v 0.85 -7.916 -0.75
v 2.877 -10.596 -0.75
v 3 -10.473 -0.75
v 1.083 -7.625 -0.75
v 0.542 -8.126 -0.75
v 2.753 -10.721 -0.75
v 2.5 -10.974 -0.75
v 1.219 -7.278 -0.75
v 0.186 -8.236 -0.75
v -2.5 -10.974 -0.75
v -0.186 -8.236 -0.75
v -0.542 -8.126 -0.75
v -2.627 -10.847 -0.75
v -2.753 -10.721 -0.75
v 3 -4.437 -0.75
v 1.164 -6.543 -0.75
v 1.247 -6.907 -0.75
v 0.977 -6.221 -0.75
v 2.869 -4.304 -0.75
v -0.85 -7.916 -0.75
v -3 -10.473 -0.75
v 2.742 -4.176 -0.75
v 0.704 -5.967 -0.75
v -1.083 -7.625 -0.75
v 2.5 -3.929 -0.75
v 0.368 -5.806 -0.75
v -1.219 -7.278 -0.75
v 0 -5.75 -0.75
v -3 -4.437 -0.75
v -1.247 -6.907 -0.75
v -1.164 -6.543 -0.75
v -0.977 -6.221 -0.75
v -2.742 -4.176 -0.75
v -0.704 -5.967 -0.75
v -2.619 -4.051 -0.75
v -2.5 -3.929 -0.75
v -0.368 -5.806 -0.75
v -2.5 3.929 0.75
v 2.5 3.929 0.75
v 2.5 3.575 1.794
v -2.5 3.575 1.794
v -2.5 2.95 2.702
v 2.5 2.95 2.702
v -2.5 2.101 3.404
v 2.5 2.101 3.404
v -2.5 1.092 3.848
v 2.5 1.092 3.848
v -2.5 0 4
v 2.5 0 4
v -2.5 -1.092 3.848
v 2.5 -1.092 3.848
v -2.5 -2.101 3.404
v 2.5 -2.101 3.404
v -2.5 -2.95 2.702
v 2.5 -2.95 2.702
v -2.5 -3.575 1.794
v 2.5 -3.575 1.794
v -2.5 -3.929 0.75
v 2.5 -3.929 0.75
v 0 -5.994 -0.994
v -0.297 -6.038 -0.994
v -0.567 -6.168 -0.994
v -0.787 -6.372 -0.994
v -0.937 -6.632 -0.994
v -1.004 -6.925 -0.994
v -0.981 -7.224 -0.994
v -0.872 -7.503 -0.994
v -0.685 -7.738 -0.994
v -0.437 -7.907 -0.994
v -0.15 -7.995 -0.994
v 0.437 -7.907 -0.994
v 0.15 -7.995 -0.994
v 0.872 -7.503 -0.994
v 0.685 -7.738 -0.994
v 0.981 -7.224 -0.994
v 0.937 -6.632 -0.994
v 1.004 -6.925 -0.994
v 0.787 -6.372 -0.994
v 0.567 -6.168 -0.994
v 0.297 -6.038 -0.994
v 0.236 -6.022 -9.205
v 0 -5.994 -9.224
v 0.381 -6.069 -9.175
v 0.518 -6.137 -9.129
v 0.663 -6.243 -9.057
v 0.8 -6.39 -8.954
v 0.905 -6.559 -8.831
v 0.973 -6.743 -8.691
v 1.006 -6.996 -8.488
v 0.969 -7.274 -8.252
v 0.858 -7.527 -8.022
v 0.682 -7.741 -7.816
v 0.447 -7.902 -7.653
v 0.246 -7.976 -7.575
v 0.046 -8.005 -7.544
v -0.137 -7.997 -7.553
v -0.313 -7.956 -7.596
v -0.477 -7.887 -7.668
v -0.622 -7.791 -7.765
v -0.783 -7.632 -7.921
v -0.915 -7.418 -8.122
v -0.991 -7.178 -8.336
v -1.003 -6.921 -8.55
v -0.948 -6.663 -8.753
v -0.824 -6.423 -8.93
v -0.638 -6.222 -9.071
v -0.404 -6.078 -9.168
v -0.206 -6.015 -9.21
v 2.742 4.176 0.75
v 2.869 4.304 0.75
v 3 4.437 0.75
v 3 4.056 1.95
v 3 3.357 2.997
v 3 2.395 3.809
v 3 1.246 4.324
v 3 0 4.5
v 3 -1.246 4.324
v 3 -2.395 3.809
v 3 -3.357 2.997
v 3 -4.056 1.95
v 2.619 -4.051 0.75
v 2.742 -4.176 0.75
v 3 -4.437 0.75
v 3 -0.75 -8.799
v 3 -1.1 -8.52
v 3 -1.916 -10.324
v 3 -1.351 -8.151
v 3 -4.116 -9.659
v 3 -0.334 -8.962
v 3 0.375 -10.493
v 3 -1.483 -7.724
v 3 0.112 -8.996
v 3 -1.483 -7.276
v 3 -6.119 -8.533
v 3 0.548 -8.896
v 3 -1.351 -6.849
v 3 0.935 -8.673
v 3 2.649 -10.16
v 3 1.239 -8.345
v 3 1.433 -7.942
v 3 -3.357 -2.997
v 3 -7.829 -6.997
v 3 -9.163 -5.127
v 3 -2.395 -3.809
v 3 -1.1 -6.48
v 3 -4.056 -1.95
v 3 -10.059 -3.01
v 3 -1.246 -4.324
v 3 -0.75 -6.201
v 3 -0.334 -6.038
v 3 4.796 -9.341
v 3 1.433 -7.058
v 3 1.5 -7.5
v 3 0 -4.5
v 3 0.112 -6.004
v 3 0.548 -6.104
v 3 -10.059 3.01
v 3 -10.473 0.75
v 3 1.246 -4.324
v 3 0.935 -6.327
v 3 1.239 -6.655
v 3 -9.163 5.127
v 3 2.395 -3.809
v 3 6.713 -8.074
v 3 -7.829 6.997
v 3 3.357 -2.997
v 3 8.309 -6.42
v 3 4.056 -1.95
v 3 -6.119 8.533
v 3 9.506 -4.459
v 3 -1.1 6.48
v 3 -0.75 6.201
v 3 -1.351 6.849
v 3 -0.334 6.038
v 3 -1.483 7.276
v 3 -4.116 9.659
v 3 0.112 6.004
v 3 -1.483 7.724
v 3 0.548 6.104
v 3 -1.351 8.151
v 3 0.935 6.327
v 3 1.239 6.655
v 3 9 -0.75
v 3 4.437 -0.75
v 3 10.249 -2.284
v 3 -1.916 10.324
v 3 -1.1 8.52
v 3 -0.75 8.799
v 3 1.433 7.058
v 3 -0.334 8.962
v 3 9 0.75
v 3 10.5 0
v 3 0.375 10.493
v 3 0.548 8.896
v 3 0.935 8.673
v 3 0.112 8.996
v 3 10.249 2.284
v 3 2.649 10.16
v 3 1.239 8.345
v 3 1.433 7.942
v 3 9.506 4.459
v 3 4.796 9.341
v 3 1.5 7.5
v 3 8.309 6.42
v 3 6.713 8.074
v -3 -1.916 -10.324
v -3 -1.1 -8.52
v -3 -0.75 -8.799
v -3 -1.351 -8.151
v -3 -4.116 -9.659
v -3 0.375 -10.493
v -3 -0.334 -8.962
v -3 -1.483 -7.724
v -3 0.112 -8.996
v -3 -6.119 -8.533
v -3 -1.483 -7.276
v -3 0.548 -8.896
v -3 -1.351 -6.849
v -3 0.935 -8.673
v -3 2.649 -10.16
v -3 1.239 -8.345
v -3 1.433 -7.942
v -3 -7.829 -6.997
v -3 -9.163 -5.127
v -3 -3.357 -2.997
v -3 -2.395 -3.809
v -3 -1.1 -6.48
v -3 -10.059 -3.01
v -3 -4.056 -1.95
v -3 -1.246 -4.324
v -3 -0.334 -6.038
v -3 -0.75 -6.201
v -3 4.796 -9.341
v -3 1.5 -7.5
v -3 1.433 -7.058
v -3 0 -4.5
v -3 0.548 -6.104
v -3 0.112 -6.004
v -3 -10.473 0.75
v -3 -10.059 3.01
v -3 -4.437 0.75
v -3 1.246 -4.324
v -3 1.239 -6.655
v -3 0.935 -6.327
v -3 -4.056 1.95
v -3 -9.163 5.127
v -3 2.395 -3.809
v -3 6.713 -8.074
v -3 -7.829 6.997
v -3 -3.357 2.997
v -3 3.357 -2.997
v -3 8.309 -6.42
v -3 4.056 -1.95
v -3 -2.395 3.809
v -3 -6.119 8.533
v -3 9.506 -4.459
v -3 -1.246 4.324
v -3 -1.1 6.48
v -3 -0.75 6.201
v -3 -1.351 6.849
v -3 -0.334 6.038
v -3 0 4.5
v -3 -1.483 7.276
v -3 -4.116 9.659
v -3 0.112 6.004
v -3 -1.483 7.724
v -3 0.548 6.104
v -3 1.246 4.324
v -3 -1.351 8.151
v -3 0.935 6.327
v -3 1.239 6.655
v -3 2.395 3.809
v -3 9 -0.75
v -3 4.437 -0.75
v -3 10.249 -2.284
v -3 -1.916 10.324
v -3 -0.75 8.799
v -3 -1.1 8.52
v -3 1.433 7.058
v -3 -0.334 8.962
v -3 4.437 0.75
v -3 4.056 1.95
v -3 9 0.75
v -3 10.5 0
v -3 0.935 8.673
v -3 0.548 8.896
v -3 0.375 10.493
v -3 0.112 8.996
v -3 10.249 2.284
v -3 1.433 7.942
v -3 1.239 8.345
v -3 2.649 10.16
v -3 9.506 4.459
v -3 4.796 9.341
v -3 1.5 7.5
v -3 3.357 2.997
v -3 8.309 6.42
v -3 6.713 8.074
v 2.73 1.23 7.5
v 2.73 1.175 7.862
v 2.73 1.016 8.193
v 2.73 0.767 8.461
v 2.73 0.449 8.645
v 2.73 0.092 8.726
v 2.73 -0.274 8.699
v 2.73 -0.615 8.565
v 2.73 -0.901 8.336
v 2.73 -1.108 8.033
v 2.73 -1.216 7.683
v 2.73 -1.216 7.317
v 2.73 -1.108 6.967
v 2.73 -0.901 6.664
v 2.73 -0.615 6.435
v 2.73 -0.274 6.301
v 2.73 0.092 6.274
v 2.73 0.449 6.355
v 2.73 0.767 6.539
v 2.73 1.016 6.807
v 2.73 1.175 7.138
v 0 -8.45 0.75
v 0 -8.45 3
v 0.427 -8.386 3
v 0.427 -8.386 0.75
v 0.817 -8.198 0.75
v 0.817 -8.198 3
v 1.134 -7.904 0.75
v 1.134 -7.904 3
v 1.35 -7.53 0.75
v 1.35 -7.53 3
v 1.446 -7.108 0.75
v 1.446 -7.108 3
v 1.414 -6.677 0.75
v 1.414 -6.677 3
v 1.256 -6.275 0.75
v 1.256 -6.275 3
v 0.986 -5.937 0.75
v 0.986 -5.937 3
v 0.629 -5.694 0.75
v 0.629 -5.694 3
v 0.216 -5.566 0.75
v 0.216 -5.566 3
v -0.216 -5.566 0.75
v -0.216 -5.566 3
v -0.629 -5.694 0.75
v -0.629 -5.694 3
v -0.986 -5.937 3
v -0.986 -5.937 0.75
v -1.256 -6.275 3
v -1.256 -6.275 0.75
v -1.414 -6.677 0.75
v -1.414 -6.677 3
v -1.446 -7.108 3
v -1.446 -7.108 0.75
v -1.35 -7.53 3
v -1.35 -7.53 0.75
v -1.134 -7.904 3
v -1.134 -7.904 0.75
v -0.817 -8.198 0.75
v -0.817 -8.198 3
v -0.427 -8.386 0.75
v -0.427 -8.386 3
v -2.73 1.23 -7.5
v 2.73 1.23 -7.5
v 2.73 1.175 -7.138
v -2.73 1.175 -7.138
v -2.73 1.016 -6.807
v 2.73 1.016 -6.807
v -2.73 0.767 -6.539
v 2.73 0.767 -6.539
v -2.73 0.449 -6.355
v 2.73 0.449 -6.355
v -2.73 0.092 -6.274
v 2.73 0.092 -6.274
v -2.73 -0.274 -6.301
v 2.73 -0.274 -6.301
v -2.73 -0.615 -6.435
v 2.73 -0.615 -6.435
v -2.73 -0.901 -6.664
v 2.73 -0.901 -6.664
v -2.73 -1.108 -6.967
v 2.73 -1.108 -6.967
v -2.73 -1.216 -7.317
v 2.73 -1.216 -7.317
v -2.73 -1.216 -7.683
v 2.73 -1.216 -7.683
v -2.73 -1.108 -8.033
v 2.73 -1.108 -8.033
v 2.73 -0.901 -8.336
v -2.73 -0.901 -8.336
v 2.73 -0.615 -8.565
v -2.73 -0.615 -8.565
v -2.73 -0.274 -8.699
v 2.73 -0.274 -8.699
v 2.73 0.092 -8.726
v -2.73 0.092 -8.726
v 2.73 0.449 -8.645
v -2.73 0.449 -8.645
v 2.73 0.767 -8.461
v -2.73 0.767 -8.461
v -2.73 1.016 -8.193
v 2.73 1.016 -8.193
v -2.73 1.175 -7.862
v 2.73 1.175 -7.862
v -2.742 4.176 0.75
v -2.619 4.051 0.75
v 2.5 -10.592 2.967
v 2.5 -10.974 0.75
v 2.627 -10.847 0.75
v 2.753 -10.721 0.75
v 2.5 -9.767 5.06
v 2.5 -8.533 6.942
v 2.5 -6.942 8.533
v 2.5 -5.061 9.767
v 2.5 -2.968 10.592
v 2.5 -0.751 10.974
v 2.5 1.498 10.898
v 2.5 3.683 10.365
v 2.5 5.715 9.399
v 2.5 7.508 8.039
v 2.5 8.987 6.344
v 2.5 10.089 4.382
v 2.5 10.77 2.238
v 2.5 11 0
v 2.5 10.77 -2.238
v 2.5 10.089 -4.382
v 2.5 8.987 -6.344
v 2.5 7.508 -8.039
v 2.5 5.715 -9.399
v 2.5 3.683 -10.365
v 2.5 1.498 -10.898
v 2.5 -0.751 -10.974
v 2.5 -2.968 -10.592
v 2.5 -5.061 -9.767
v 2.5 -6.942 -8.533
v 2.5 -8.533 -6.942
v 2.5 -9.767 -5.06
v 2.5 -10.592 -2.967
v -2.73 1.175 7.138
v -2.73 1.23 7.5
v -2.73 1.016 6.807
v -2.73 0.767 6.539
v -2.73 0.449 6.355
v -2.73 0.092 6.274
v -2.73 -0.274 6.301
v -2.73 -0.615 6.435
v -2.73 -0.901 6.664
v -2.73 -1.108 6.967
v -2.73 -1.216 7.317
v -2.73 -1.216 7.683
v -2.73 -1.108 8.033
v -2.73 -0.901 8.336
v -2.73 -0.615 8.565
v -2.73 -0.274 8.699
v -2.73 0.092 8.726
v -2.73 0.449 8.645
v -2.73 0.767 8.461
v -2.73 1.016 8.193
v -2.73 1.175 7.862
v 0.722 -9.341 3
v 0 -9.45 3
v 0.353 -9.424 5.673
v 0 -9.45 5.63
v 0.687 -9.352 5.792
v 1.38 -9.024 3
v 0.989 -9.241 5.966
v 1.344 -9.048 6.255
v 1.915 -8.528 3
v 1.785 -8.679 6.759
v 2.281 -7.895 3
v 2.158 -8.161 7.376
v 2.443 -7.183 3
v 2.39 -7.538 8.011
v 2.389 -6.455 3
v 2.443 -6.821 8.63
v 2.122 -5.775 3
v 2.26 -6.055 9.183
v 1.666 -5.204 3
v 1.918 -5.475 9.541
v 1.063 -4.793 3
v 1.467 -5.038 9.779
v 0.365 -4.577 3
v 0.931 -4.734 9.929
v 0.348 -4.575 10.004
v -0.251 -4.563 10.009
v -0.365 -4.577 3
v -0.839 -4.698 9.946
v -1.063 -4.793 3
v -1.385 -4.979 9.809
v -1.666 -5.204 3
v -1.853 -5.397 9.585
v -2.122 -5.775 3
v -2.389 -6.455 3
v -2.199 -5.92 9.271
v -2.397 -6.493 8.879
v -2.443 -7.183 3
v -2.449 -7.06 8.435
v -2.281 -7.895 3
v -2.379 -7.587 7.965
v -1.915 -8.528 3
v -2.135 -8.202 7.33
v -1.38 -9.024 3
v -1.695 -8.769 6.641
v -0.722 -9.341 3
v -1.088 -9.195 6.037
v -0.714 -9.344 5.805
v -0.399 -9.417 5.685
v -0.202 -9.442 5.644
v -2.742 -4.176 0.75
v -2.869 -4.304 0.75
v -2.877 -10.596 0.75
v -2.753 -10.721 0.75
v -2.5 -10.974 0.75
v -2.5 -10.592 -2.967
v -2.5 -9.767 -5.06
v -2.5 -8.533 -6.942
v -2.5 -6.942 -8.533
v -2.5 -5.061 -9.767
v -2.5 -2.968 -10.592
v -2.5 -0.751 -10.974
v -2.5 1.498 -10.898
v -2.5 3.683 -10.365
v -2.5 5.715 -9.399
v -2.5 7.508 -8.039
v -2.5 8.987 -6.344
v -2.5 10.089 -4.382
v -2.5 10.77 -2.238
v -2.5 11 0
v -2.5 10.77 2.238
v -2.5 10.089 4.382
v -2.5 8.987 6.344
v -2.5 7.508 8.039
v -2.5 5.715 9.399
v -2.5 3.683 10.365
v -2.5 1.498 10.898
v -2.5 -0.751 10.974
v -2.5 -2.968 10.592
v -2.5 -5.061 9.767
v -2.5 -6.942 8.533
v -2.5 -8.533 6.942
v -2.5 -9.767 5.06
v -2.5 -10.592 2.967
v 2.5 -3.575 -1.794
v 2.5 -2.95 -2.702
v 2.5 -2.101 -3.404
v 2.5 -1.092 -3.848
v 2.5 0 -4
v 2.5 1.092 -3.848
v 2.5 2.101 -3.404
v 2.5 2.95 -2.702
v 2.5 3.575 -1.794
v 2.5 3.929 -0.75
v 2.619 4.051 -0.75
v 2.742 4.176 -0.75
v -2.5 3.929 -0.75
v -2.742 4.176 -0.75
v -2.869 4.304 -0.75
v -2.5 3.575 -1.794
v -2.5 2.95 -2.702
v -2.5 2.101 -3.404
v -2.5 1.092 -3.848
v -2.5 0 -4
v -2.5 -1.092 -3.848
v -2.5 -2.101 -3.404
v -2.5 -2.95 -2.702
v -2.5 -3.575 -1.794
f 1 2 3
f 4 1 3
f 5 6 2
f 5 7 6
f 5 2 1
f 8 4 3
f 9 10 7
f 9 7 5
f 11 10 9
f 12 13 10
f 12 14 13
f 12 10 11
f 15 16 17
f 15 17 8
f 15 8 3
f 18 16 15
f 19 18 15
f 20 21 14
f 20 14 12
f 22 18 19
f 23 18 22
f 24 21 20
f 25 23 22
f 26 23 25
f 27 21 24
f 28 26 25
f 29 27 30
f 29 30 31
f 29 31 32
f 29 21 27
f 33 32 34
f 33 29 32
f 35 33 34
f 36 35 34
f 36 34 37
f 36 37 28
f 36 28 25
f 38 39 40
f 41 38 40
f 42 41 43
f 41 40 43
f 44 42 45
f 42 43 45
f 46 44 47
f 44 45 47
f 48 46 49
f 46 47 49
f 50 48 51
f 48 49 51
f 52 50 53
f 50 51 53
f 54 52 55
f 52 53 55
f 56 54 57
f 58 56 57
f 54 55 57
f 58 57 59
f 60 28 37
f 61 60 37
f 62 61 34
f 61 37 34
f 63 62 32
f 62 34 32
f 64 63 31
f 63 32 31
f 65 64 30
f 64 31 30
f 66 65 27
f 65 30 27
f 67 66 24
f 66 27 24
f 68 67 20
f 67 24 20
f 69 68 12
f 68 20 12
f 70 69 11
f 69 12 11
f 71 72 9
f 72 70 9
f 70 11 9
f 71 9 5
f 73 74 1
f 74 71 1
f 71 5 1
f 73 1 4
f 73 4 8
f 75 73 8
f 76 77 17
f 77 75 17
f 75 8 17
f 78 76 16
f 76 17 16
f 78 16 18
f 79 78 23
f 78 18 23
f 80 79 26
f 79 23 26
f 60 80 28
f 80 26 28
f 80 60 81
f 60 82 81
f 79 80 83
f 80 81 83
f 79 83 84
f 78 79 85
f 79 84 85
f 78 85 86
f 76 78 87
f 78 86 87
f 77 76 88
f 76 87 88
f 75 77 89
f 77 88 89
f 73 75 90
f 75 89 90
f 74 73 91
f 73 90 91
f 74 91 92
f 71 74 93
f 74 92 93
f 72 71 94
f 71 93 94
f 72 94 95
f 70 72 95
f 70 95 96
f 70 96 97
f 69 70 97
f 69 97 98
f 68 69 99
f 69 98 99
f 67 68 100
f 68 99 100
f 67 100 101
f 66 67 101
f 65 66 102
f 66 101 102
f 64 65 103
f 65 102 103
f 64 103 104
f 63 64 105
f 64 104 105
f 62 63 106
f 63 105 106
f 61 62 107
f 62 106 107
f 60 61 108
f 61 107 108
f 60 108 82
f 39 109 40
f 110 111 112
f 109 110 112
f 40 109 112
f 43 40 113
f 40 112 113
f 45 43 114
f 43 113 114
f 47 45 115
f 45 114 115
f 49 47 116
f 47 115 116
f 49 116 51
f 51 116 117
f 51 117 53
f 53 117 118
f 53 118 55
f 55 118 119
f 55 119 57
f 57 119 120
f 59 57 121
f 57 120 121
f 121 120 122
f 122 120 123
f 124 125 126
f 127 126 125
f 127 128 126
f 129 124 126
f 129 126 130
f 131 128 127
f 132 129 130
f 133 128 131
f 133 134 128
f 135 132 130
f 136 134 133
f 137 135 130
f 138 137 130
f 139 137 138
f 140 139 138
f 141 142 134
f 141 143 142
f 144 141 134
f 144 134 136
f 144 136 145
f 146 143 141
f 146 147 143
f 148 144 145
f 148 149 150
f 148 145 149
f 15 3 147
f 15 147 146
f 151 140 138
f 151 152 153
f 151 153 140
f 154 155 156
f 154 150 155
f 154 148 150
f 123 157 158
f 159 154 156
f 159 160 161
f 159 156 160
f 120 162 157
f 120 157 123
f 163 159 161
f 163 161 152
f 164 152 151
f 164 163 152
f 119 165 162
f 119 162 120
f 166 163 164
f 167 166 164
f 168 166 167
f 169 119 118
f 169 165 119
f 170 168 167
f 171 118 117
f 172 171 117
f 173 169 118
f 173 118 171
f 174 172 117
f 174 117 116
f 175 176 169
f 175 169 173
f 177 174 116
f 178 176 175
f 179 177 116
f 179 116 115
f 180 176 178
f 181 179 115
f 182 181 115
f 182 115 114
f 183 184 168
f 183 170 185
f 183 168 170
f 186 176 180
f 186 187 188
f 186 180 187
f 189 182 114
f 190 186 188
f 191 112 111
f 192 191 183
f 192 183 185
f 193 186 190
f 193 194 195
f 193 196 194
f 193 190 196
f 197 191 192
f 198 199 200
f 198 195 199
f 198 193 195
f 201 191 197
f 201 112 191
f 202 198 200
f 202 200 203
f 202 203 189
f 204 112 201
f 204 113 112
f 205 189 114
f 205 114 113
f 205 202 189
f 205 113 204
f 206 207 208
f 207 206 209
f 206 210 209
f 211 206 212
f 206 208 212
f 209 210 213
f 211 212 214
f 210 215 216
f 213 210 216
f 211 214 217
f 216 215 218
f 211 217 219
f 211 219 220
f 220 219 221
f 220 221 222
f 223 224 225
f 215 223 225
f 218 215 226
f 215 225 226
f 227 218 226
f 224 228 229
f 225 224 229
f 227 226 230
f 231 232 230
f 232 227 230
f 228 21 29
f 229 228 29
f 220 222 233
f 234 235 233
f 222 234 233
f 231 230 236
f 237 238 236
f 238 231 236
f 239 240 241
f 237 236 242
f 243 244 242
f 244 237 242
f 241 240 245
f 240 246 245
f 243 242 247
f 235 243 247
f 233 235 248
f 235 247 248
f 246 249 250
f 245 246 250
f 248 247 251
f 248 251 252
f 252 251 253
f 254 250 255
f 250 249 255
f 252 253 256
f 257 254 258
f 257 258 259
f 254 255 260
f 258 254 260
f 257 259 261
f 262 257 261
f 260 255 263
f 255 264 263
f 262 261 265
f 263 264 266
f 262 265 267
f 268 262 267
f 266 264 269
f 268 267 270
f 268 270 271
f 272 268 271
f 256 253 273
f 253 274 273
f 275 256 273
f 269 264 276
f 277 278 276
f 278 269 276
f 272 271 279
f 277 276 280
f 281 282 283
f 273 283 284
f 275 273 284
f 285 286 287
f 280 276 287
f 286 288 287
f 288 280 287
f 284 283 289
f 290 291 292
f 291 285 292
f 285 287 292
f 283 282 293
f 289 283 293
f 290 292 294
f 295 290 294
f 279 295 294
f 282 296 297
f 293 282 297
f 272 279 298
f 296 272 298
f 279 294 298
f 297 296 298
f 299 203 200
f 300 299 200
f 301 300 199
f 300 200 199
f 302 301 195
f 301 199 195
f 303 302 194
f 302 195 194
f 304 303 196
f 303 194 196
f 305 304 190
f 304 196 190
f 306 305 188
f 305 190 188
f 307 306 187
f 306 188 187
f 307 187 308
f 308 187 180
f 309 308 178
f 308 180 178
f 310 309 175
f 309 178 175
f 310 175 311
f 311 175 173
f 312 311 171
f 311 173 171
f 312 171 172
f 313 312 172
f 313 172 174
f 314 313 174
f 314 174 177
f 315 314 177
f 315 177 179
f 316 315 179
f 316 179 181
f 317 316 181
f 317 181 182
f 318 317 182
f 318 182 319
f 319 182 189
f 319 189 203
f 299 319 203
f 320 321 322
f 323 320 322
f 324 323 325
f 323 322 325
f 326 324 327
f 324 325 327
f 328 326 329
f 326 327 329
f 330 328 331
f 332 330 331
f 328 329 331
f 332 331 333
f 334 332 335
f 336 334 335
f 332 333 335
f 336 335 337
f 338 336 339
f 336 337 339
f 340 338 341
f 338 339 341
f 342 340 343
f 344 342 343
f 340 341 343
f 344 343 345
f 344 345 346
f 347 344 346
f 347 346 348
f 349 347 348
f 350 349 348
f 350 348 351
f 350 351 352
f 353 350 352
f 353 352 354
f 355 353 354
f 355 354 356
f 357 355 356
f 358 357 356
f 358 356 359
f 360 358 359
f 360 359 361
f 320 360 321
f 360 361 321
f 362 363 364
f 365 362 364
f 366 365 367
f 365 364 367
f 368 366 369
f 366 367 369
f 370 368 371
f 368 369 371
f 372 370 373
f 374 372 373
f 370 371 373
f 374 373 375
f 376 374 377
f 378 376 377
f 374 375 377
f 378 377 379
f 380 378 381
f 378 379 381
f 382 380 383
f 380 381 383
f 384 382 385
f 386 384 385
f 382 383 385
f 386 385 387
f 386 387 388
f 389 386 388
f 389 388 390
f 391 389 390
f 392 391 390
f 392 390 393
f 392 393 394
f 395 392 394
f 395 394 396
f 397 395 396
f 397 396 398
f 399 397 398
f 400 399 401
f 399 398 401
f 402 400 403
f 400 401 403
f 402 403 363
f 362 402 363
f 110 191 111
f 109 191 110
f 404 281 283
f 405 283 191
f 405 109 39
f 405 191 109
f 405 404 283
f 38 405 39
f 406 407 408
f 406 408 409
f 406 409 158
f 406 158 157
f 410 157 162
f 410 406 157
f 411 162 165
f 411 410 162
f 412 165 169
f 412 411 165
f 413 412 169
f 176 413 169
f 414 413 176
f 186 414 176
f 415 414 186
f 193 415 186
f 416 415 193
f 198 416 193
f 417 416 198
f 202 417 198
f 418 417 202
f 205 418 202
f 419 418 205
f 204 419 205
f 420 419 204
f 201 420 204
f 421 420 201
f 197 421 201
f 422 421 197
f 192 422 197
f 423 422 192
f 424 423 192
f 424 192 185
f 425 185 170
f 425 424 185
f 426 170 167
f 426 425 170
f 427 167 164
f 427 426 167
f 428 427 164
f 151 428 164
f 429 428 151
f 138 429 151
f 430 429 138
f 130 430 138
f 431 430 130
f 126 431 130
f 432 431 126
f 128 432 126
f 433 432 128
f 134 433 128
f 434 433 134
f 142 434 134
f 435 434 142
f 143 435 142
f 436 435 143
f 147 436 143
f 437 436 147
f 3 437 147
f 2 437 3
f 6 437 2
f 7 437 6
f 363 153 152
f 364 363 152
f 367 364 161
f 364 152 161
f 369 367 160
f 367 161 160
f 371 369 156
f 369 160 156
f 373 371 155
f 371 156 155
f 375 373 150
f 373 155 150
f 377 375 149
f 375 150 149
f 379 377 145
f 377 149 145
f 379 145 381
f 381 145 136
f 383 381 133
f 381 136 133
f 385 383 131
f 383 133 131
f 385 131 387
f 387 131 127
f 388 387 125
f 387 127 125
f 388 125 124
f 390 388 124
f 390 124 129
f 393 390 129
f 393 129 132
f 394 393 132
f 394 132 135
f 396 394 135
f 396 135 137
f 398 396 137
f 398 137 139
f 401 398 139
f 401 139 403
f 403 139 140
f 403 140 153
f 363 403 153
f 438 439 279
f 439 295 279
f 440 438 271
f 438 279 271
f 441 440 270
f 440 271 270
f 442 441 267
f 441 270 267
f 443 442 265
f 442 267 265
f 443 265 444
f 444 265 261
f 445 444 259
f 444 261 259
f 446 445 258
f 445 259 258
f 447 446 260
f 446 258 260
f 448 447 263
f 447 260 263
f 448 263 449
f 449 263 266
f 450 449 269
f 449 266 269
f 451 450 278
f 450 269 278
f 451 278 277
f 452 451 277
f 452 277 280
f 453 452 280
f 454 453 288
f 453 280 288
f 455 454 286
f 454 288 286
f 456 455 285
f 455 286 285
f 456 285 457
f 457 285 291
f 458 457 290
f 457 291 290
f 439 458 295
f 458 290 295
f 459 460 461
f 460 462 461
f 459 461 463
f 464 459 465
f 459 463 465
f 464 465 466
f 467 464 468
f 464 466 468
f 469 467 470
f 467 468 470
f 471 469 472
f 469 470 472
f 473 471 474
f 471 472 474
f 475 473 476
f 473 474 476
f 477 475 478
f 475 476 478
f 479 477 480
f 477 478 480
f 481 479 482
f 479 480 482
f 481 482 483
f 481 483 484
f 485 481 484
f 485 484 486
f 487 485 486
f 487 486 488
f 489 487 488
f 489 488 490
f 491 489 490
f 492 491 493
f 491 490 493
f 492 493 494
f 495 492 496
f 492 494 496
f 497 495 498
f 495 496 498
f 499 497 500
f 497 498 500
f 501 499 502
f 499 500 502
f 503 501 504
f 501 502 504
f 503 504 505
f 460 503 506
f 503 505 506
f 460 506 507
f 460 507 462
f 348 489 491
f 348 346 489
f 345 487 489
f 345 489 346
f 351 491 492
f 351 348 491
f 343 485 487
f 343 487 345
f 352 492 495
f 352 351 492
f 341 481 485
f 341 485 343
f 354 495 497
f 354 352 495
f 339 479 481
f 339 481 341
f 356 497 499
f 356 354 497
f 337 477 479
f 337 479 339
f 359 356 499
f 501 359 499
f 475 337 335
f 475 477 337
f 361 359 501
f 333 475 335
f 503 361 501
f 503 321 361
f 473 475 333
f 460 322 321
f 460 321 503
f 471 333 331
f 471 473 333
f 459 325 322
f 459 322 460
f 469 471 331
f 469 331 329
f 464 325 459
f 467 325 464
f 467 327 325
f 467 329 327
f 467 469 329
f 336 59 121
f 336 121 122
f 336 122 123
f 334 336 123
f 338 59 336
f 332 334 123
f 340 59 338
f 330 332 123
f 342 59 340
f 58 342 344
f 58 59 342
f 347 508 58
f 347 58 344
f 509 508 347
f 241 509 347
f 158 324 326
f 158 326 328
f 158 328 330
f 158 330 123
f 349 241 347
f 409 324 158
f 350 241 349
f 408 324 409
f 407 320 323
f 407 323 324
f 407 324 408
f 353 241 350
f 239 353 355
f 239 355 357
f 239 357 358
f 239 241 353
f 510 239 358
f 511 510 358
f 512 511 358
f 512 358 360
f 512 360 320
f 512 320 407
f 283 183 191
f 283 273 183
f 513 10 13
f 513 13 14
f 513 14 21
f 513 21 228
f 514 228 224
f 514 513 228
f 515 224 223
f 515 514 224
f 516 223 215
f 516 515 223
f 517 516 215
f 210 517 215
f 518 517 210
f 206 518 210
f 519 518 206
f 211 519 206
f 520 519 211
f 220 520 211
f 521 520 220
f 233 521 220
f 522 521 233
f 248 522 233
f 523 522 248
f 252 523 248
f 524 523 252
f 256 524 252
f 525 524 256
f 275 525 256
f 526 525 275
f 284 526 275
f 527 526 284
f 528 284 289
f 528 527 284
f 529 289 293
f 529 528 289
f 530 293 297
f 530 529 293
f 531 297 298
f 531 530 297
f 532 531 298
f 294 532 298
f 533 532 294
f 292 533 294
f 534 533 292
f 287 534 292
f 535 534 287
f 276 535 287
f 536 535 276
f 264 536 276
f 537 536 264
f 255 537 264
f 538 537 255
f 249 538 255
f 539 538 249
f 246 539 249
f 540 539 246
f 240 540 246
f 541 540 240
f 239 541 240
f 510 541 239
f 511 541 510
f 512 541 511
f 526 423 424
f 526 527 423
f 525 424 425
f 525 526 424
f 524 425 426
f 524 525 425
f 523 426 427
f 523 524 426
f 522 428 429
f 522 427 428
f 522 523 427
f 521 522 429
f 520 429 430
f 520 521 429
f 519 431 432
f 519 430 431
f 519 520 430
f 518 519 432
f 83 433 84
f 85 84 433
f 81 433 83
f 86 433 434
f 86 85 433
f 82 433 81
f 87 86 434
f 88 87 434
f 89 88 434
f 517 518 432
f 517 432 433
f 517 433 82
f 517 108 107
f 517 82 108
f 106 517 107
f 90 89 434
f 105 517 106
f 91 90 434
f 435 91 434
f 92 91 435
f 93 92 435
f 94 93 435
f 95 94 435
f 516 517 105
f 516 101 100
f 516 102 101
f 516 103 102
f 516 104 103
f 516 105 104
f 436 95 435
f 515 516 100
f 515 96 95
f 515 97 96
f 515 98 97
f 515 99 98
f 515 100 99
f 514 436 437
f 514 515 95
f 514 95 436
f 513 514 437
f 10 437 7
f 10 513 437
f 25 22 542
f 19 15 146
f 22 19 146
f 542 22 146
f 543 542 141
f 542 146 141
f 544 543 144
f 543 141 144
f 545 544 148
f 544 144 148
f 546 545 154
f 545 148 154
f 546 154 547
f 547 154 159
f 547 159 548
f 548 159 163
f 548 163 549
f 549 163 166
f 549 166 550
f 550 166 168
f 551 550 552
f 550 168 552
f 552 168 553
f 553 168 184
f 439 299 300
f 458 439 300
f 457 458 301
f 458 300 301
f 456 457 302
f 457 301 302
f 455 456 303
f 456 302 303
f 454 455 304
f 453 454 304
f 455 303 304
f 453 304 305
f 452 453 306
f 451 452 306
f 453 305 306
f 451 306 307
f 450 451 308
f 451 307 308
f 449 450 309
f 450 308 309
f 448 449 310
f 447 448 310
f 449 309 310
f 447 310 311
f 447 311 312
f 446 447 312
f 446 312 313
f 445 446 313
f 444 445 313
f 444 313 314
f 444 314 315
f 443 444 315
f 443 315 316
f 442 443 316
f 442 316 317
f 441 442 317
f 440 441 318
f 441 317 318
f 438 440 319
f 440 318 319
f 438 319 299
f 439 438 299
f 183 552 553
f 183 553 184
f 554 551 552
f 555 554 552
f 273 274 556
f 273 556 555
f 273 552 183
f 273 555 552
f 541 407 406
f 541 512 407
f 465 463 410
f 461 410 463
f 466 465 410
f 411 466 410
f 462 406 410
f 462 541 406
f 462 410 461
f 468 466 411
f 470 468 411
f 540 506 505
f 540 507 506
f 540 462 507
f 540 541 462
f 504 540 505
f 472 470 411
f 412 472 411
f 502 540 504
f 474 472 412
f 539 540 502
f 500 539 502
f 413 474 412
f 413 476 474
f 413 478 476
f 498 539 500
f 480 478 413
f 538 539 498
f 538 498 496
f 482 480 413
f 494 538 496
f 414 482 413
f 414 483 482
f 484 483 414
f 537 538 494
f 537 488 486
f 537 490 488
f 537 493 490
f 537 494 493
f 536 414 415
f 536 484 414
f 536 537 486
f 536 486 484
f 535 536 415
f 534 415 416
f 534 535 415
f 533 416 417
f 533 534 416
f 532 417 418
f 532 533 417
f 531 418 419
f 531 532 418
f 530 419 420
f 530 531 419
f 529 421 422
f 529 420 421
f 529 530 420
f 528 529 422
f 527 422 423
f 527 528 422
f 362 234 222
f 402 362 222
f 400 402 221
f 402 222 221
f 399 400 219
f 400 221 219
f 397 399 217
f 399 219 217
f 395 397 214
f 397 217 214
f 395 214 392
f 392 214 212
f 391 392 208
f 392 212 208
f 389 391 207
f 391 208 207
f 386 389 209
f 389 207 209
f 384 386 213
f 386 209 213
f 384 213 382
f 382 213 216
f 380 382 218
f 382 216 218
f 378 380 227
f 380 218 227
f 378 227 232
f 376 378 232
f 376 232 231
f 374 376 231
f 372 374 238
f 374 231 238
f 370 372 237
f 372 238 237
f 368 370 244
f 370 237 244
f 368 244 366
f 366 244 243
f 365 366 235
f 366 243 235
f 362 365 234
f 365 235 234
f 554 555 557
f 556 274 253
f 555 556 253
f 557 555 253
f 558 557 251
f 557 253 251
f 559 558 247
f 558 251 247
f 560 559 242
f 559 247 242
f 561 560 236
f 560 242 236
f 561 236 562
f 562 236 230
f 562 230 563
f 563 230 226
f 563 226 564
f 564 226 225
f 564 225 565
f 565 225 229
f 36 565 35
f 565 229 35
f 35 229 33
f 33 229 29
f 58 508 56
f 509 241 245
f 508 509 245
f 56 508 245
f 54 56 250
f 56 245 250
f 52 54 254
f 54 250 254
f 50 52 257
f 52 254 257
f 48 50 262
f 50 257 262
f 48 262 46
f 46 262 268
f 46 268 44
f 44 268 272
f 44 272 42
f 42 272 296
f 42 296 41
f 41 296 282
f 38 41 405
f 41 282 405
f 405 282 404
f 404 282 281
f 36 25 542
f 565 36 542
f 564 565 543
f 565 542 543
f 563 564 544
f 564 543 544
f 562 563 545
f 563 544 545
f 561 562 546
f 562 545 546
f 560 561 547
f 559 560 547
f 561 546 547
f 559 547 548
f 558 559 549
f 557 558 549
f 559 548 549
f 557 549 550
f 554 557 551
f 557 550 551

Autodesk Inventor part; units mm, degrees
sketch "Sketch_1" plane through (0, 0, 0) normal (0, 0, 1) x (1, 0, 0)
  line L0 (3, 0) -> (-3, 0)
  line L1 (-3, 10.5) -> (-3, 4.5)
  line L2 (-3, 4.5) -> (-2.5, 4)
  line L3 (-2.5, 4) -> (2.5, 4)
  line L4 (2.5, 4) -> (3, 4.5)
  line L5 (3, 4.5) -> (3, 10.5)
  line L6 (3, 10.5) -> (2.5, 11)
  line L7 (2.5, 11) -> (-2.5, 11)
  line L8 (-2.5, 11) -> (-3, 10.5)
revolve "Revolution1" add sketch "Sketch_1" angle 360 about axis through (3, 0, 0) along (1, 0, 0)
sketch "Sketch_2" plane through (0, 0, 0) normal (1, 0, 0) x (0, 1, 0)
  line L0 (-11, 0.75) -> (-11, -0.75)
  line L1 (-11, -0.75) -> (9, -0.75)
  line L2 (9, -0.75) -> (9, 0.75)
  line L3 (9, 0.75) -> (-11, 0.75)
extrude "Extrusion1" cut sketch "Sketch_2" along normal mid plane 6
sketch "Sketch_3" plane through (0, 0, 0) normal (1, 0, 0) x (0, 1, 0)
  line L0 (-7, 11) -> (-7, 0)
  line L1 (-7, 0) -> (-8.45, 0)
  line L2 (-8.45, 0) -> (-8.45, 3)
  line L3 (-8.45, 3) -> (-9.45, 3)
  line L4 (-9.45, 3) -> (-9.45, 11)
  line L5 (-9.45, 11) -> (-7, 11)
  line L6 (-7, 11) -> (-7, 0)
revolve "Revolution2" cut sketch "Sketch_3" angle 360 about axis through (0, -7, 11) along (0, 0, 1)
sketch "Sketch_4" plane through (0, 0, 0) normal (1, 0, 0) x (0, 1, 0)
  line L0 (-7, -11.25) -> (-7, -0.75)
  line L1 (-7, -0.75) -> (-5.75, -0.75)
  line L2 (-5.75, -0.75) -> (-5.9935, -0.9935)
  line L3 (-5.9935, -0.9935) -> (-5.9935, -11.25)
  line L4 (-5.9935, -11.25) -> (-7, -11.25)
  line L5 (-7, -11.25) -> (-7, -0.75)
revolve "Revolution3" cut sketch "Sketch_4" angle 360 about axis through (0, -7, -11.25) along (0, 0, -1)
thread "Thread1" size "M2.5x0.45" class "6H" standard "ISO Metric profile" length 8.384
sketch "Sketch_7" plane through (0, 0, -7.5) normal (0, 0, 1) x (1, 0, 0)
  line L0 (3, 0) -> (-3, 0)
  line L1 (-3, 0) -> (-3, 1.5)
  line L2 (-3, 1.5) -> (-2.7295, 1.2295)
  line L3 (-2.7295, 1.2295) -> (2.7295, 1.2295)
  line L4 (2.7295, 1.2295) -> (3, 1.5)
  line L5 (3, 1.5) -> (3, 0)
  line L6 (3, 0) -> (-3, 0)
revolve "Revolution4" cut sketch "Sketch_7" angle 360 about axis through (3, 0, -7.5) along (1, 0, 0)
thread "Thread2" size "M3x0.5" class "6H" standard "ISO Metric profile" full length
sketch "Sketch_8" plane through (0, 0, 7.5) normal (0, 0, 1) x (1, 0, 0)
  line L0 (3, 0) -> (-3, 0)
  line L1 (-3, 0) -> (-3, 1.5)
  line L2 (-3, 1.5) -> (-2.7295, 1.2295)
  line L3 (-2.7295, 1.2295) -> (2.7295, 1.2295)
  line L4 (2.7295, 1.2295) -> (3, 1.5)
  line L5 (3, 1.5) -> (3, 0)
  line L6 (3, 0) -> (-3, 0)
revolve "Revolution5" cut sketch "Sketch_8" angle 360 about axis through (3, 0, 7.5) along (1, 0, 0)
thread "Thread3" size "M3x0.5" class "6H" standard "ISO Metric profile" full length
ref_plane "body_screw_XY" through (0, -7, 3) normal (0, 0, 1) x (1, 0, 0)
ref_plane "body_screw_YZ" through (0, -7, 3) normal (1, 0, 0) x (0, 1, 0)
ref_plane "body_screw_ZX" through (0, -7, 3) normal (0, 1, 0) x (0, 0, 1)
properties part number "SCSWJ8-6_b"
